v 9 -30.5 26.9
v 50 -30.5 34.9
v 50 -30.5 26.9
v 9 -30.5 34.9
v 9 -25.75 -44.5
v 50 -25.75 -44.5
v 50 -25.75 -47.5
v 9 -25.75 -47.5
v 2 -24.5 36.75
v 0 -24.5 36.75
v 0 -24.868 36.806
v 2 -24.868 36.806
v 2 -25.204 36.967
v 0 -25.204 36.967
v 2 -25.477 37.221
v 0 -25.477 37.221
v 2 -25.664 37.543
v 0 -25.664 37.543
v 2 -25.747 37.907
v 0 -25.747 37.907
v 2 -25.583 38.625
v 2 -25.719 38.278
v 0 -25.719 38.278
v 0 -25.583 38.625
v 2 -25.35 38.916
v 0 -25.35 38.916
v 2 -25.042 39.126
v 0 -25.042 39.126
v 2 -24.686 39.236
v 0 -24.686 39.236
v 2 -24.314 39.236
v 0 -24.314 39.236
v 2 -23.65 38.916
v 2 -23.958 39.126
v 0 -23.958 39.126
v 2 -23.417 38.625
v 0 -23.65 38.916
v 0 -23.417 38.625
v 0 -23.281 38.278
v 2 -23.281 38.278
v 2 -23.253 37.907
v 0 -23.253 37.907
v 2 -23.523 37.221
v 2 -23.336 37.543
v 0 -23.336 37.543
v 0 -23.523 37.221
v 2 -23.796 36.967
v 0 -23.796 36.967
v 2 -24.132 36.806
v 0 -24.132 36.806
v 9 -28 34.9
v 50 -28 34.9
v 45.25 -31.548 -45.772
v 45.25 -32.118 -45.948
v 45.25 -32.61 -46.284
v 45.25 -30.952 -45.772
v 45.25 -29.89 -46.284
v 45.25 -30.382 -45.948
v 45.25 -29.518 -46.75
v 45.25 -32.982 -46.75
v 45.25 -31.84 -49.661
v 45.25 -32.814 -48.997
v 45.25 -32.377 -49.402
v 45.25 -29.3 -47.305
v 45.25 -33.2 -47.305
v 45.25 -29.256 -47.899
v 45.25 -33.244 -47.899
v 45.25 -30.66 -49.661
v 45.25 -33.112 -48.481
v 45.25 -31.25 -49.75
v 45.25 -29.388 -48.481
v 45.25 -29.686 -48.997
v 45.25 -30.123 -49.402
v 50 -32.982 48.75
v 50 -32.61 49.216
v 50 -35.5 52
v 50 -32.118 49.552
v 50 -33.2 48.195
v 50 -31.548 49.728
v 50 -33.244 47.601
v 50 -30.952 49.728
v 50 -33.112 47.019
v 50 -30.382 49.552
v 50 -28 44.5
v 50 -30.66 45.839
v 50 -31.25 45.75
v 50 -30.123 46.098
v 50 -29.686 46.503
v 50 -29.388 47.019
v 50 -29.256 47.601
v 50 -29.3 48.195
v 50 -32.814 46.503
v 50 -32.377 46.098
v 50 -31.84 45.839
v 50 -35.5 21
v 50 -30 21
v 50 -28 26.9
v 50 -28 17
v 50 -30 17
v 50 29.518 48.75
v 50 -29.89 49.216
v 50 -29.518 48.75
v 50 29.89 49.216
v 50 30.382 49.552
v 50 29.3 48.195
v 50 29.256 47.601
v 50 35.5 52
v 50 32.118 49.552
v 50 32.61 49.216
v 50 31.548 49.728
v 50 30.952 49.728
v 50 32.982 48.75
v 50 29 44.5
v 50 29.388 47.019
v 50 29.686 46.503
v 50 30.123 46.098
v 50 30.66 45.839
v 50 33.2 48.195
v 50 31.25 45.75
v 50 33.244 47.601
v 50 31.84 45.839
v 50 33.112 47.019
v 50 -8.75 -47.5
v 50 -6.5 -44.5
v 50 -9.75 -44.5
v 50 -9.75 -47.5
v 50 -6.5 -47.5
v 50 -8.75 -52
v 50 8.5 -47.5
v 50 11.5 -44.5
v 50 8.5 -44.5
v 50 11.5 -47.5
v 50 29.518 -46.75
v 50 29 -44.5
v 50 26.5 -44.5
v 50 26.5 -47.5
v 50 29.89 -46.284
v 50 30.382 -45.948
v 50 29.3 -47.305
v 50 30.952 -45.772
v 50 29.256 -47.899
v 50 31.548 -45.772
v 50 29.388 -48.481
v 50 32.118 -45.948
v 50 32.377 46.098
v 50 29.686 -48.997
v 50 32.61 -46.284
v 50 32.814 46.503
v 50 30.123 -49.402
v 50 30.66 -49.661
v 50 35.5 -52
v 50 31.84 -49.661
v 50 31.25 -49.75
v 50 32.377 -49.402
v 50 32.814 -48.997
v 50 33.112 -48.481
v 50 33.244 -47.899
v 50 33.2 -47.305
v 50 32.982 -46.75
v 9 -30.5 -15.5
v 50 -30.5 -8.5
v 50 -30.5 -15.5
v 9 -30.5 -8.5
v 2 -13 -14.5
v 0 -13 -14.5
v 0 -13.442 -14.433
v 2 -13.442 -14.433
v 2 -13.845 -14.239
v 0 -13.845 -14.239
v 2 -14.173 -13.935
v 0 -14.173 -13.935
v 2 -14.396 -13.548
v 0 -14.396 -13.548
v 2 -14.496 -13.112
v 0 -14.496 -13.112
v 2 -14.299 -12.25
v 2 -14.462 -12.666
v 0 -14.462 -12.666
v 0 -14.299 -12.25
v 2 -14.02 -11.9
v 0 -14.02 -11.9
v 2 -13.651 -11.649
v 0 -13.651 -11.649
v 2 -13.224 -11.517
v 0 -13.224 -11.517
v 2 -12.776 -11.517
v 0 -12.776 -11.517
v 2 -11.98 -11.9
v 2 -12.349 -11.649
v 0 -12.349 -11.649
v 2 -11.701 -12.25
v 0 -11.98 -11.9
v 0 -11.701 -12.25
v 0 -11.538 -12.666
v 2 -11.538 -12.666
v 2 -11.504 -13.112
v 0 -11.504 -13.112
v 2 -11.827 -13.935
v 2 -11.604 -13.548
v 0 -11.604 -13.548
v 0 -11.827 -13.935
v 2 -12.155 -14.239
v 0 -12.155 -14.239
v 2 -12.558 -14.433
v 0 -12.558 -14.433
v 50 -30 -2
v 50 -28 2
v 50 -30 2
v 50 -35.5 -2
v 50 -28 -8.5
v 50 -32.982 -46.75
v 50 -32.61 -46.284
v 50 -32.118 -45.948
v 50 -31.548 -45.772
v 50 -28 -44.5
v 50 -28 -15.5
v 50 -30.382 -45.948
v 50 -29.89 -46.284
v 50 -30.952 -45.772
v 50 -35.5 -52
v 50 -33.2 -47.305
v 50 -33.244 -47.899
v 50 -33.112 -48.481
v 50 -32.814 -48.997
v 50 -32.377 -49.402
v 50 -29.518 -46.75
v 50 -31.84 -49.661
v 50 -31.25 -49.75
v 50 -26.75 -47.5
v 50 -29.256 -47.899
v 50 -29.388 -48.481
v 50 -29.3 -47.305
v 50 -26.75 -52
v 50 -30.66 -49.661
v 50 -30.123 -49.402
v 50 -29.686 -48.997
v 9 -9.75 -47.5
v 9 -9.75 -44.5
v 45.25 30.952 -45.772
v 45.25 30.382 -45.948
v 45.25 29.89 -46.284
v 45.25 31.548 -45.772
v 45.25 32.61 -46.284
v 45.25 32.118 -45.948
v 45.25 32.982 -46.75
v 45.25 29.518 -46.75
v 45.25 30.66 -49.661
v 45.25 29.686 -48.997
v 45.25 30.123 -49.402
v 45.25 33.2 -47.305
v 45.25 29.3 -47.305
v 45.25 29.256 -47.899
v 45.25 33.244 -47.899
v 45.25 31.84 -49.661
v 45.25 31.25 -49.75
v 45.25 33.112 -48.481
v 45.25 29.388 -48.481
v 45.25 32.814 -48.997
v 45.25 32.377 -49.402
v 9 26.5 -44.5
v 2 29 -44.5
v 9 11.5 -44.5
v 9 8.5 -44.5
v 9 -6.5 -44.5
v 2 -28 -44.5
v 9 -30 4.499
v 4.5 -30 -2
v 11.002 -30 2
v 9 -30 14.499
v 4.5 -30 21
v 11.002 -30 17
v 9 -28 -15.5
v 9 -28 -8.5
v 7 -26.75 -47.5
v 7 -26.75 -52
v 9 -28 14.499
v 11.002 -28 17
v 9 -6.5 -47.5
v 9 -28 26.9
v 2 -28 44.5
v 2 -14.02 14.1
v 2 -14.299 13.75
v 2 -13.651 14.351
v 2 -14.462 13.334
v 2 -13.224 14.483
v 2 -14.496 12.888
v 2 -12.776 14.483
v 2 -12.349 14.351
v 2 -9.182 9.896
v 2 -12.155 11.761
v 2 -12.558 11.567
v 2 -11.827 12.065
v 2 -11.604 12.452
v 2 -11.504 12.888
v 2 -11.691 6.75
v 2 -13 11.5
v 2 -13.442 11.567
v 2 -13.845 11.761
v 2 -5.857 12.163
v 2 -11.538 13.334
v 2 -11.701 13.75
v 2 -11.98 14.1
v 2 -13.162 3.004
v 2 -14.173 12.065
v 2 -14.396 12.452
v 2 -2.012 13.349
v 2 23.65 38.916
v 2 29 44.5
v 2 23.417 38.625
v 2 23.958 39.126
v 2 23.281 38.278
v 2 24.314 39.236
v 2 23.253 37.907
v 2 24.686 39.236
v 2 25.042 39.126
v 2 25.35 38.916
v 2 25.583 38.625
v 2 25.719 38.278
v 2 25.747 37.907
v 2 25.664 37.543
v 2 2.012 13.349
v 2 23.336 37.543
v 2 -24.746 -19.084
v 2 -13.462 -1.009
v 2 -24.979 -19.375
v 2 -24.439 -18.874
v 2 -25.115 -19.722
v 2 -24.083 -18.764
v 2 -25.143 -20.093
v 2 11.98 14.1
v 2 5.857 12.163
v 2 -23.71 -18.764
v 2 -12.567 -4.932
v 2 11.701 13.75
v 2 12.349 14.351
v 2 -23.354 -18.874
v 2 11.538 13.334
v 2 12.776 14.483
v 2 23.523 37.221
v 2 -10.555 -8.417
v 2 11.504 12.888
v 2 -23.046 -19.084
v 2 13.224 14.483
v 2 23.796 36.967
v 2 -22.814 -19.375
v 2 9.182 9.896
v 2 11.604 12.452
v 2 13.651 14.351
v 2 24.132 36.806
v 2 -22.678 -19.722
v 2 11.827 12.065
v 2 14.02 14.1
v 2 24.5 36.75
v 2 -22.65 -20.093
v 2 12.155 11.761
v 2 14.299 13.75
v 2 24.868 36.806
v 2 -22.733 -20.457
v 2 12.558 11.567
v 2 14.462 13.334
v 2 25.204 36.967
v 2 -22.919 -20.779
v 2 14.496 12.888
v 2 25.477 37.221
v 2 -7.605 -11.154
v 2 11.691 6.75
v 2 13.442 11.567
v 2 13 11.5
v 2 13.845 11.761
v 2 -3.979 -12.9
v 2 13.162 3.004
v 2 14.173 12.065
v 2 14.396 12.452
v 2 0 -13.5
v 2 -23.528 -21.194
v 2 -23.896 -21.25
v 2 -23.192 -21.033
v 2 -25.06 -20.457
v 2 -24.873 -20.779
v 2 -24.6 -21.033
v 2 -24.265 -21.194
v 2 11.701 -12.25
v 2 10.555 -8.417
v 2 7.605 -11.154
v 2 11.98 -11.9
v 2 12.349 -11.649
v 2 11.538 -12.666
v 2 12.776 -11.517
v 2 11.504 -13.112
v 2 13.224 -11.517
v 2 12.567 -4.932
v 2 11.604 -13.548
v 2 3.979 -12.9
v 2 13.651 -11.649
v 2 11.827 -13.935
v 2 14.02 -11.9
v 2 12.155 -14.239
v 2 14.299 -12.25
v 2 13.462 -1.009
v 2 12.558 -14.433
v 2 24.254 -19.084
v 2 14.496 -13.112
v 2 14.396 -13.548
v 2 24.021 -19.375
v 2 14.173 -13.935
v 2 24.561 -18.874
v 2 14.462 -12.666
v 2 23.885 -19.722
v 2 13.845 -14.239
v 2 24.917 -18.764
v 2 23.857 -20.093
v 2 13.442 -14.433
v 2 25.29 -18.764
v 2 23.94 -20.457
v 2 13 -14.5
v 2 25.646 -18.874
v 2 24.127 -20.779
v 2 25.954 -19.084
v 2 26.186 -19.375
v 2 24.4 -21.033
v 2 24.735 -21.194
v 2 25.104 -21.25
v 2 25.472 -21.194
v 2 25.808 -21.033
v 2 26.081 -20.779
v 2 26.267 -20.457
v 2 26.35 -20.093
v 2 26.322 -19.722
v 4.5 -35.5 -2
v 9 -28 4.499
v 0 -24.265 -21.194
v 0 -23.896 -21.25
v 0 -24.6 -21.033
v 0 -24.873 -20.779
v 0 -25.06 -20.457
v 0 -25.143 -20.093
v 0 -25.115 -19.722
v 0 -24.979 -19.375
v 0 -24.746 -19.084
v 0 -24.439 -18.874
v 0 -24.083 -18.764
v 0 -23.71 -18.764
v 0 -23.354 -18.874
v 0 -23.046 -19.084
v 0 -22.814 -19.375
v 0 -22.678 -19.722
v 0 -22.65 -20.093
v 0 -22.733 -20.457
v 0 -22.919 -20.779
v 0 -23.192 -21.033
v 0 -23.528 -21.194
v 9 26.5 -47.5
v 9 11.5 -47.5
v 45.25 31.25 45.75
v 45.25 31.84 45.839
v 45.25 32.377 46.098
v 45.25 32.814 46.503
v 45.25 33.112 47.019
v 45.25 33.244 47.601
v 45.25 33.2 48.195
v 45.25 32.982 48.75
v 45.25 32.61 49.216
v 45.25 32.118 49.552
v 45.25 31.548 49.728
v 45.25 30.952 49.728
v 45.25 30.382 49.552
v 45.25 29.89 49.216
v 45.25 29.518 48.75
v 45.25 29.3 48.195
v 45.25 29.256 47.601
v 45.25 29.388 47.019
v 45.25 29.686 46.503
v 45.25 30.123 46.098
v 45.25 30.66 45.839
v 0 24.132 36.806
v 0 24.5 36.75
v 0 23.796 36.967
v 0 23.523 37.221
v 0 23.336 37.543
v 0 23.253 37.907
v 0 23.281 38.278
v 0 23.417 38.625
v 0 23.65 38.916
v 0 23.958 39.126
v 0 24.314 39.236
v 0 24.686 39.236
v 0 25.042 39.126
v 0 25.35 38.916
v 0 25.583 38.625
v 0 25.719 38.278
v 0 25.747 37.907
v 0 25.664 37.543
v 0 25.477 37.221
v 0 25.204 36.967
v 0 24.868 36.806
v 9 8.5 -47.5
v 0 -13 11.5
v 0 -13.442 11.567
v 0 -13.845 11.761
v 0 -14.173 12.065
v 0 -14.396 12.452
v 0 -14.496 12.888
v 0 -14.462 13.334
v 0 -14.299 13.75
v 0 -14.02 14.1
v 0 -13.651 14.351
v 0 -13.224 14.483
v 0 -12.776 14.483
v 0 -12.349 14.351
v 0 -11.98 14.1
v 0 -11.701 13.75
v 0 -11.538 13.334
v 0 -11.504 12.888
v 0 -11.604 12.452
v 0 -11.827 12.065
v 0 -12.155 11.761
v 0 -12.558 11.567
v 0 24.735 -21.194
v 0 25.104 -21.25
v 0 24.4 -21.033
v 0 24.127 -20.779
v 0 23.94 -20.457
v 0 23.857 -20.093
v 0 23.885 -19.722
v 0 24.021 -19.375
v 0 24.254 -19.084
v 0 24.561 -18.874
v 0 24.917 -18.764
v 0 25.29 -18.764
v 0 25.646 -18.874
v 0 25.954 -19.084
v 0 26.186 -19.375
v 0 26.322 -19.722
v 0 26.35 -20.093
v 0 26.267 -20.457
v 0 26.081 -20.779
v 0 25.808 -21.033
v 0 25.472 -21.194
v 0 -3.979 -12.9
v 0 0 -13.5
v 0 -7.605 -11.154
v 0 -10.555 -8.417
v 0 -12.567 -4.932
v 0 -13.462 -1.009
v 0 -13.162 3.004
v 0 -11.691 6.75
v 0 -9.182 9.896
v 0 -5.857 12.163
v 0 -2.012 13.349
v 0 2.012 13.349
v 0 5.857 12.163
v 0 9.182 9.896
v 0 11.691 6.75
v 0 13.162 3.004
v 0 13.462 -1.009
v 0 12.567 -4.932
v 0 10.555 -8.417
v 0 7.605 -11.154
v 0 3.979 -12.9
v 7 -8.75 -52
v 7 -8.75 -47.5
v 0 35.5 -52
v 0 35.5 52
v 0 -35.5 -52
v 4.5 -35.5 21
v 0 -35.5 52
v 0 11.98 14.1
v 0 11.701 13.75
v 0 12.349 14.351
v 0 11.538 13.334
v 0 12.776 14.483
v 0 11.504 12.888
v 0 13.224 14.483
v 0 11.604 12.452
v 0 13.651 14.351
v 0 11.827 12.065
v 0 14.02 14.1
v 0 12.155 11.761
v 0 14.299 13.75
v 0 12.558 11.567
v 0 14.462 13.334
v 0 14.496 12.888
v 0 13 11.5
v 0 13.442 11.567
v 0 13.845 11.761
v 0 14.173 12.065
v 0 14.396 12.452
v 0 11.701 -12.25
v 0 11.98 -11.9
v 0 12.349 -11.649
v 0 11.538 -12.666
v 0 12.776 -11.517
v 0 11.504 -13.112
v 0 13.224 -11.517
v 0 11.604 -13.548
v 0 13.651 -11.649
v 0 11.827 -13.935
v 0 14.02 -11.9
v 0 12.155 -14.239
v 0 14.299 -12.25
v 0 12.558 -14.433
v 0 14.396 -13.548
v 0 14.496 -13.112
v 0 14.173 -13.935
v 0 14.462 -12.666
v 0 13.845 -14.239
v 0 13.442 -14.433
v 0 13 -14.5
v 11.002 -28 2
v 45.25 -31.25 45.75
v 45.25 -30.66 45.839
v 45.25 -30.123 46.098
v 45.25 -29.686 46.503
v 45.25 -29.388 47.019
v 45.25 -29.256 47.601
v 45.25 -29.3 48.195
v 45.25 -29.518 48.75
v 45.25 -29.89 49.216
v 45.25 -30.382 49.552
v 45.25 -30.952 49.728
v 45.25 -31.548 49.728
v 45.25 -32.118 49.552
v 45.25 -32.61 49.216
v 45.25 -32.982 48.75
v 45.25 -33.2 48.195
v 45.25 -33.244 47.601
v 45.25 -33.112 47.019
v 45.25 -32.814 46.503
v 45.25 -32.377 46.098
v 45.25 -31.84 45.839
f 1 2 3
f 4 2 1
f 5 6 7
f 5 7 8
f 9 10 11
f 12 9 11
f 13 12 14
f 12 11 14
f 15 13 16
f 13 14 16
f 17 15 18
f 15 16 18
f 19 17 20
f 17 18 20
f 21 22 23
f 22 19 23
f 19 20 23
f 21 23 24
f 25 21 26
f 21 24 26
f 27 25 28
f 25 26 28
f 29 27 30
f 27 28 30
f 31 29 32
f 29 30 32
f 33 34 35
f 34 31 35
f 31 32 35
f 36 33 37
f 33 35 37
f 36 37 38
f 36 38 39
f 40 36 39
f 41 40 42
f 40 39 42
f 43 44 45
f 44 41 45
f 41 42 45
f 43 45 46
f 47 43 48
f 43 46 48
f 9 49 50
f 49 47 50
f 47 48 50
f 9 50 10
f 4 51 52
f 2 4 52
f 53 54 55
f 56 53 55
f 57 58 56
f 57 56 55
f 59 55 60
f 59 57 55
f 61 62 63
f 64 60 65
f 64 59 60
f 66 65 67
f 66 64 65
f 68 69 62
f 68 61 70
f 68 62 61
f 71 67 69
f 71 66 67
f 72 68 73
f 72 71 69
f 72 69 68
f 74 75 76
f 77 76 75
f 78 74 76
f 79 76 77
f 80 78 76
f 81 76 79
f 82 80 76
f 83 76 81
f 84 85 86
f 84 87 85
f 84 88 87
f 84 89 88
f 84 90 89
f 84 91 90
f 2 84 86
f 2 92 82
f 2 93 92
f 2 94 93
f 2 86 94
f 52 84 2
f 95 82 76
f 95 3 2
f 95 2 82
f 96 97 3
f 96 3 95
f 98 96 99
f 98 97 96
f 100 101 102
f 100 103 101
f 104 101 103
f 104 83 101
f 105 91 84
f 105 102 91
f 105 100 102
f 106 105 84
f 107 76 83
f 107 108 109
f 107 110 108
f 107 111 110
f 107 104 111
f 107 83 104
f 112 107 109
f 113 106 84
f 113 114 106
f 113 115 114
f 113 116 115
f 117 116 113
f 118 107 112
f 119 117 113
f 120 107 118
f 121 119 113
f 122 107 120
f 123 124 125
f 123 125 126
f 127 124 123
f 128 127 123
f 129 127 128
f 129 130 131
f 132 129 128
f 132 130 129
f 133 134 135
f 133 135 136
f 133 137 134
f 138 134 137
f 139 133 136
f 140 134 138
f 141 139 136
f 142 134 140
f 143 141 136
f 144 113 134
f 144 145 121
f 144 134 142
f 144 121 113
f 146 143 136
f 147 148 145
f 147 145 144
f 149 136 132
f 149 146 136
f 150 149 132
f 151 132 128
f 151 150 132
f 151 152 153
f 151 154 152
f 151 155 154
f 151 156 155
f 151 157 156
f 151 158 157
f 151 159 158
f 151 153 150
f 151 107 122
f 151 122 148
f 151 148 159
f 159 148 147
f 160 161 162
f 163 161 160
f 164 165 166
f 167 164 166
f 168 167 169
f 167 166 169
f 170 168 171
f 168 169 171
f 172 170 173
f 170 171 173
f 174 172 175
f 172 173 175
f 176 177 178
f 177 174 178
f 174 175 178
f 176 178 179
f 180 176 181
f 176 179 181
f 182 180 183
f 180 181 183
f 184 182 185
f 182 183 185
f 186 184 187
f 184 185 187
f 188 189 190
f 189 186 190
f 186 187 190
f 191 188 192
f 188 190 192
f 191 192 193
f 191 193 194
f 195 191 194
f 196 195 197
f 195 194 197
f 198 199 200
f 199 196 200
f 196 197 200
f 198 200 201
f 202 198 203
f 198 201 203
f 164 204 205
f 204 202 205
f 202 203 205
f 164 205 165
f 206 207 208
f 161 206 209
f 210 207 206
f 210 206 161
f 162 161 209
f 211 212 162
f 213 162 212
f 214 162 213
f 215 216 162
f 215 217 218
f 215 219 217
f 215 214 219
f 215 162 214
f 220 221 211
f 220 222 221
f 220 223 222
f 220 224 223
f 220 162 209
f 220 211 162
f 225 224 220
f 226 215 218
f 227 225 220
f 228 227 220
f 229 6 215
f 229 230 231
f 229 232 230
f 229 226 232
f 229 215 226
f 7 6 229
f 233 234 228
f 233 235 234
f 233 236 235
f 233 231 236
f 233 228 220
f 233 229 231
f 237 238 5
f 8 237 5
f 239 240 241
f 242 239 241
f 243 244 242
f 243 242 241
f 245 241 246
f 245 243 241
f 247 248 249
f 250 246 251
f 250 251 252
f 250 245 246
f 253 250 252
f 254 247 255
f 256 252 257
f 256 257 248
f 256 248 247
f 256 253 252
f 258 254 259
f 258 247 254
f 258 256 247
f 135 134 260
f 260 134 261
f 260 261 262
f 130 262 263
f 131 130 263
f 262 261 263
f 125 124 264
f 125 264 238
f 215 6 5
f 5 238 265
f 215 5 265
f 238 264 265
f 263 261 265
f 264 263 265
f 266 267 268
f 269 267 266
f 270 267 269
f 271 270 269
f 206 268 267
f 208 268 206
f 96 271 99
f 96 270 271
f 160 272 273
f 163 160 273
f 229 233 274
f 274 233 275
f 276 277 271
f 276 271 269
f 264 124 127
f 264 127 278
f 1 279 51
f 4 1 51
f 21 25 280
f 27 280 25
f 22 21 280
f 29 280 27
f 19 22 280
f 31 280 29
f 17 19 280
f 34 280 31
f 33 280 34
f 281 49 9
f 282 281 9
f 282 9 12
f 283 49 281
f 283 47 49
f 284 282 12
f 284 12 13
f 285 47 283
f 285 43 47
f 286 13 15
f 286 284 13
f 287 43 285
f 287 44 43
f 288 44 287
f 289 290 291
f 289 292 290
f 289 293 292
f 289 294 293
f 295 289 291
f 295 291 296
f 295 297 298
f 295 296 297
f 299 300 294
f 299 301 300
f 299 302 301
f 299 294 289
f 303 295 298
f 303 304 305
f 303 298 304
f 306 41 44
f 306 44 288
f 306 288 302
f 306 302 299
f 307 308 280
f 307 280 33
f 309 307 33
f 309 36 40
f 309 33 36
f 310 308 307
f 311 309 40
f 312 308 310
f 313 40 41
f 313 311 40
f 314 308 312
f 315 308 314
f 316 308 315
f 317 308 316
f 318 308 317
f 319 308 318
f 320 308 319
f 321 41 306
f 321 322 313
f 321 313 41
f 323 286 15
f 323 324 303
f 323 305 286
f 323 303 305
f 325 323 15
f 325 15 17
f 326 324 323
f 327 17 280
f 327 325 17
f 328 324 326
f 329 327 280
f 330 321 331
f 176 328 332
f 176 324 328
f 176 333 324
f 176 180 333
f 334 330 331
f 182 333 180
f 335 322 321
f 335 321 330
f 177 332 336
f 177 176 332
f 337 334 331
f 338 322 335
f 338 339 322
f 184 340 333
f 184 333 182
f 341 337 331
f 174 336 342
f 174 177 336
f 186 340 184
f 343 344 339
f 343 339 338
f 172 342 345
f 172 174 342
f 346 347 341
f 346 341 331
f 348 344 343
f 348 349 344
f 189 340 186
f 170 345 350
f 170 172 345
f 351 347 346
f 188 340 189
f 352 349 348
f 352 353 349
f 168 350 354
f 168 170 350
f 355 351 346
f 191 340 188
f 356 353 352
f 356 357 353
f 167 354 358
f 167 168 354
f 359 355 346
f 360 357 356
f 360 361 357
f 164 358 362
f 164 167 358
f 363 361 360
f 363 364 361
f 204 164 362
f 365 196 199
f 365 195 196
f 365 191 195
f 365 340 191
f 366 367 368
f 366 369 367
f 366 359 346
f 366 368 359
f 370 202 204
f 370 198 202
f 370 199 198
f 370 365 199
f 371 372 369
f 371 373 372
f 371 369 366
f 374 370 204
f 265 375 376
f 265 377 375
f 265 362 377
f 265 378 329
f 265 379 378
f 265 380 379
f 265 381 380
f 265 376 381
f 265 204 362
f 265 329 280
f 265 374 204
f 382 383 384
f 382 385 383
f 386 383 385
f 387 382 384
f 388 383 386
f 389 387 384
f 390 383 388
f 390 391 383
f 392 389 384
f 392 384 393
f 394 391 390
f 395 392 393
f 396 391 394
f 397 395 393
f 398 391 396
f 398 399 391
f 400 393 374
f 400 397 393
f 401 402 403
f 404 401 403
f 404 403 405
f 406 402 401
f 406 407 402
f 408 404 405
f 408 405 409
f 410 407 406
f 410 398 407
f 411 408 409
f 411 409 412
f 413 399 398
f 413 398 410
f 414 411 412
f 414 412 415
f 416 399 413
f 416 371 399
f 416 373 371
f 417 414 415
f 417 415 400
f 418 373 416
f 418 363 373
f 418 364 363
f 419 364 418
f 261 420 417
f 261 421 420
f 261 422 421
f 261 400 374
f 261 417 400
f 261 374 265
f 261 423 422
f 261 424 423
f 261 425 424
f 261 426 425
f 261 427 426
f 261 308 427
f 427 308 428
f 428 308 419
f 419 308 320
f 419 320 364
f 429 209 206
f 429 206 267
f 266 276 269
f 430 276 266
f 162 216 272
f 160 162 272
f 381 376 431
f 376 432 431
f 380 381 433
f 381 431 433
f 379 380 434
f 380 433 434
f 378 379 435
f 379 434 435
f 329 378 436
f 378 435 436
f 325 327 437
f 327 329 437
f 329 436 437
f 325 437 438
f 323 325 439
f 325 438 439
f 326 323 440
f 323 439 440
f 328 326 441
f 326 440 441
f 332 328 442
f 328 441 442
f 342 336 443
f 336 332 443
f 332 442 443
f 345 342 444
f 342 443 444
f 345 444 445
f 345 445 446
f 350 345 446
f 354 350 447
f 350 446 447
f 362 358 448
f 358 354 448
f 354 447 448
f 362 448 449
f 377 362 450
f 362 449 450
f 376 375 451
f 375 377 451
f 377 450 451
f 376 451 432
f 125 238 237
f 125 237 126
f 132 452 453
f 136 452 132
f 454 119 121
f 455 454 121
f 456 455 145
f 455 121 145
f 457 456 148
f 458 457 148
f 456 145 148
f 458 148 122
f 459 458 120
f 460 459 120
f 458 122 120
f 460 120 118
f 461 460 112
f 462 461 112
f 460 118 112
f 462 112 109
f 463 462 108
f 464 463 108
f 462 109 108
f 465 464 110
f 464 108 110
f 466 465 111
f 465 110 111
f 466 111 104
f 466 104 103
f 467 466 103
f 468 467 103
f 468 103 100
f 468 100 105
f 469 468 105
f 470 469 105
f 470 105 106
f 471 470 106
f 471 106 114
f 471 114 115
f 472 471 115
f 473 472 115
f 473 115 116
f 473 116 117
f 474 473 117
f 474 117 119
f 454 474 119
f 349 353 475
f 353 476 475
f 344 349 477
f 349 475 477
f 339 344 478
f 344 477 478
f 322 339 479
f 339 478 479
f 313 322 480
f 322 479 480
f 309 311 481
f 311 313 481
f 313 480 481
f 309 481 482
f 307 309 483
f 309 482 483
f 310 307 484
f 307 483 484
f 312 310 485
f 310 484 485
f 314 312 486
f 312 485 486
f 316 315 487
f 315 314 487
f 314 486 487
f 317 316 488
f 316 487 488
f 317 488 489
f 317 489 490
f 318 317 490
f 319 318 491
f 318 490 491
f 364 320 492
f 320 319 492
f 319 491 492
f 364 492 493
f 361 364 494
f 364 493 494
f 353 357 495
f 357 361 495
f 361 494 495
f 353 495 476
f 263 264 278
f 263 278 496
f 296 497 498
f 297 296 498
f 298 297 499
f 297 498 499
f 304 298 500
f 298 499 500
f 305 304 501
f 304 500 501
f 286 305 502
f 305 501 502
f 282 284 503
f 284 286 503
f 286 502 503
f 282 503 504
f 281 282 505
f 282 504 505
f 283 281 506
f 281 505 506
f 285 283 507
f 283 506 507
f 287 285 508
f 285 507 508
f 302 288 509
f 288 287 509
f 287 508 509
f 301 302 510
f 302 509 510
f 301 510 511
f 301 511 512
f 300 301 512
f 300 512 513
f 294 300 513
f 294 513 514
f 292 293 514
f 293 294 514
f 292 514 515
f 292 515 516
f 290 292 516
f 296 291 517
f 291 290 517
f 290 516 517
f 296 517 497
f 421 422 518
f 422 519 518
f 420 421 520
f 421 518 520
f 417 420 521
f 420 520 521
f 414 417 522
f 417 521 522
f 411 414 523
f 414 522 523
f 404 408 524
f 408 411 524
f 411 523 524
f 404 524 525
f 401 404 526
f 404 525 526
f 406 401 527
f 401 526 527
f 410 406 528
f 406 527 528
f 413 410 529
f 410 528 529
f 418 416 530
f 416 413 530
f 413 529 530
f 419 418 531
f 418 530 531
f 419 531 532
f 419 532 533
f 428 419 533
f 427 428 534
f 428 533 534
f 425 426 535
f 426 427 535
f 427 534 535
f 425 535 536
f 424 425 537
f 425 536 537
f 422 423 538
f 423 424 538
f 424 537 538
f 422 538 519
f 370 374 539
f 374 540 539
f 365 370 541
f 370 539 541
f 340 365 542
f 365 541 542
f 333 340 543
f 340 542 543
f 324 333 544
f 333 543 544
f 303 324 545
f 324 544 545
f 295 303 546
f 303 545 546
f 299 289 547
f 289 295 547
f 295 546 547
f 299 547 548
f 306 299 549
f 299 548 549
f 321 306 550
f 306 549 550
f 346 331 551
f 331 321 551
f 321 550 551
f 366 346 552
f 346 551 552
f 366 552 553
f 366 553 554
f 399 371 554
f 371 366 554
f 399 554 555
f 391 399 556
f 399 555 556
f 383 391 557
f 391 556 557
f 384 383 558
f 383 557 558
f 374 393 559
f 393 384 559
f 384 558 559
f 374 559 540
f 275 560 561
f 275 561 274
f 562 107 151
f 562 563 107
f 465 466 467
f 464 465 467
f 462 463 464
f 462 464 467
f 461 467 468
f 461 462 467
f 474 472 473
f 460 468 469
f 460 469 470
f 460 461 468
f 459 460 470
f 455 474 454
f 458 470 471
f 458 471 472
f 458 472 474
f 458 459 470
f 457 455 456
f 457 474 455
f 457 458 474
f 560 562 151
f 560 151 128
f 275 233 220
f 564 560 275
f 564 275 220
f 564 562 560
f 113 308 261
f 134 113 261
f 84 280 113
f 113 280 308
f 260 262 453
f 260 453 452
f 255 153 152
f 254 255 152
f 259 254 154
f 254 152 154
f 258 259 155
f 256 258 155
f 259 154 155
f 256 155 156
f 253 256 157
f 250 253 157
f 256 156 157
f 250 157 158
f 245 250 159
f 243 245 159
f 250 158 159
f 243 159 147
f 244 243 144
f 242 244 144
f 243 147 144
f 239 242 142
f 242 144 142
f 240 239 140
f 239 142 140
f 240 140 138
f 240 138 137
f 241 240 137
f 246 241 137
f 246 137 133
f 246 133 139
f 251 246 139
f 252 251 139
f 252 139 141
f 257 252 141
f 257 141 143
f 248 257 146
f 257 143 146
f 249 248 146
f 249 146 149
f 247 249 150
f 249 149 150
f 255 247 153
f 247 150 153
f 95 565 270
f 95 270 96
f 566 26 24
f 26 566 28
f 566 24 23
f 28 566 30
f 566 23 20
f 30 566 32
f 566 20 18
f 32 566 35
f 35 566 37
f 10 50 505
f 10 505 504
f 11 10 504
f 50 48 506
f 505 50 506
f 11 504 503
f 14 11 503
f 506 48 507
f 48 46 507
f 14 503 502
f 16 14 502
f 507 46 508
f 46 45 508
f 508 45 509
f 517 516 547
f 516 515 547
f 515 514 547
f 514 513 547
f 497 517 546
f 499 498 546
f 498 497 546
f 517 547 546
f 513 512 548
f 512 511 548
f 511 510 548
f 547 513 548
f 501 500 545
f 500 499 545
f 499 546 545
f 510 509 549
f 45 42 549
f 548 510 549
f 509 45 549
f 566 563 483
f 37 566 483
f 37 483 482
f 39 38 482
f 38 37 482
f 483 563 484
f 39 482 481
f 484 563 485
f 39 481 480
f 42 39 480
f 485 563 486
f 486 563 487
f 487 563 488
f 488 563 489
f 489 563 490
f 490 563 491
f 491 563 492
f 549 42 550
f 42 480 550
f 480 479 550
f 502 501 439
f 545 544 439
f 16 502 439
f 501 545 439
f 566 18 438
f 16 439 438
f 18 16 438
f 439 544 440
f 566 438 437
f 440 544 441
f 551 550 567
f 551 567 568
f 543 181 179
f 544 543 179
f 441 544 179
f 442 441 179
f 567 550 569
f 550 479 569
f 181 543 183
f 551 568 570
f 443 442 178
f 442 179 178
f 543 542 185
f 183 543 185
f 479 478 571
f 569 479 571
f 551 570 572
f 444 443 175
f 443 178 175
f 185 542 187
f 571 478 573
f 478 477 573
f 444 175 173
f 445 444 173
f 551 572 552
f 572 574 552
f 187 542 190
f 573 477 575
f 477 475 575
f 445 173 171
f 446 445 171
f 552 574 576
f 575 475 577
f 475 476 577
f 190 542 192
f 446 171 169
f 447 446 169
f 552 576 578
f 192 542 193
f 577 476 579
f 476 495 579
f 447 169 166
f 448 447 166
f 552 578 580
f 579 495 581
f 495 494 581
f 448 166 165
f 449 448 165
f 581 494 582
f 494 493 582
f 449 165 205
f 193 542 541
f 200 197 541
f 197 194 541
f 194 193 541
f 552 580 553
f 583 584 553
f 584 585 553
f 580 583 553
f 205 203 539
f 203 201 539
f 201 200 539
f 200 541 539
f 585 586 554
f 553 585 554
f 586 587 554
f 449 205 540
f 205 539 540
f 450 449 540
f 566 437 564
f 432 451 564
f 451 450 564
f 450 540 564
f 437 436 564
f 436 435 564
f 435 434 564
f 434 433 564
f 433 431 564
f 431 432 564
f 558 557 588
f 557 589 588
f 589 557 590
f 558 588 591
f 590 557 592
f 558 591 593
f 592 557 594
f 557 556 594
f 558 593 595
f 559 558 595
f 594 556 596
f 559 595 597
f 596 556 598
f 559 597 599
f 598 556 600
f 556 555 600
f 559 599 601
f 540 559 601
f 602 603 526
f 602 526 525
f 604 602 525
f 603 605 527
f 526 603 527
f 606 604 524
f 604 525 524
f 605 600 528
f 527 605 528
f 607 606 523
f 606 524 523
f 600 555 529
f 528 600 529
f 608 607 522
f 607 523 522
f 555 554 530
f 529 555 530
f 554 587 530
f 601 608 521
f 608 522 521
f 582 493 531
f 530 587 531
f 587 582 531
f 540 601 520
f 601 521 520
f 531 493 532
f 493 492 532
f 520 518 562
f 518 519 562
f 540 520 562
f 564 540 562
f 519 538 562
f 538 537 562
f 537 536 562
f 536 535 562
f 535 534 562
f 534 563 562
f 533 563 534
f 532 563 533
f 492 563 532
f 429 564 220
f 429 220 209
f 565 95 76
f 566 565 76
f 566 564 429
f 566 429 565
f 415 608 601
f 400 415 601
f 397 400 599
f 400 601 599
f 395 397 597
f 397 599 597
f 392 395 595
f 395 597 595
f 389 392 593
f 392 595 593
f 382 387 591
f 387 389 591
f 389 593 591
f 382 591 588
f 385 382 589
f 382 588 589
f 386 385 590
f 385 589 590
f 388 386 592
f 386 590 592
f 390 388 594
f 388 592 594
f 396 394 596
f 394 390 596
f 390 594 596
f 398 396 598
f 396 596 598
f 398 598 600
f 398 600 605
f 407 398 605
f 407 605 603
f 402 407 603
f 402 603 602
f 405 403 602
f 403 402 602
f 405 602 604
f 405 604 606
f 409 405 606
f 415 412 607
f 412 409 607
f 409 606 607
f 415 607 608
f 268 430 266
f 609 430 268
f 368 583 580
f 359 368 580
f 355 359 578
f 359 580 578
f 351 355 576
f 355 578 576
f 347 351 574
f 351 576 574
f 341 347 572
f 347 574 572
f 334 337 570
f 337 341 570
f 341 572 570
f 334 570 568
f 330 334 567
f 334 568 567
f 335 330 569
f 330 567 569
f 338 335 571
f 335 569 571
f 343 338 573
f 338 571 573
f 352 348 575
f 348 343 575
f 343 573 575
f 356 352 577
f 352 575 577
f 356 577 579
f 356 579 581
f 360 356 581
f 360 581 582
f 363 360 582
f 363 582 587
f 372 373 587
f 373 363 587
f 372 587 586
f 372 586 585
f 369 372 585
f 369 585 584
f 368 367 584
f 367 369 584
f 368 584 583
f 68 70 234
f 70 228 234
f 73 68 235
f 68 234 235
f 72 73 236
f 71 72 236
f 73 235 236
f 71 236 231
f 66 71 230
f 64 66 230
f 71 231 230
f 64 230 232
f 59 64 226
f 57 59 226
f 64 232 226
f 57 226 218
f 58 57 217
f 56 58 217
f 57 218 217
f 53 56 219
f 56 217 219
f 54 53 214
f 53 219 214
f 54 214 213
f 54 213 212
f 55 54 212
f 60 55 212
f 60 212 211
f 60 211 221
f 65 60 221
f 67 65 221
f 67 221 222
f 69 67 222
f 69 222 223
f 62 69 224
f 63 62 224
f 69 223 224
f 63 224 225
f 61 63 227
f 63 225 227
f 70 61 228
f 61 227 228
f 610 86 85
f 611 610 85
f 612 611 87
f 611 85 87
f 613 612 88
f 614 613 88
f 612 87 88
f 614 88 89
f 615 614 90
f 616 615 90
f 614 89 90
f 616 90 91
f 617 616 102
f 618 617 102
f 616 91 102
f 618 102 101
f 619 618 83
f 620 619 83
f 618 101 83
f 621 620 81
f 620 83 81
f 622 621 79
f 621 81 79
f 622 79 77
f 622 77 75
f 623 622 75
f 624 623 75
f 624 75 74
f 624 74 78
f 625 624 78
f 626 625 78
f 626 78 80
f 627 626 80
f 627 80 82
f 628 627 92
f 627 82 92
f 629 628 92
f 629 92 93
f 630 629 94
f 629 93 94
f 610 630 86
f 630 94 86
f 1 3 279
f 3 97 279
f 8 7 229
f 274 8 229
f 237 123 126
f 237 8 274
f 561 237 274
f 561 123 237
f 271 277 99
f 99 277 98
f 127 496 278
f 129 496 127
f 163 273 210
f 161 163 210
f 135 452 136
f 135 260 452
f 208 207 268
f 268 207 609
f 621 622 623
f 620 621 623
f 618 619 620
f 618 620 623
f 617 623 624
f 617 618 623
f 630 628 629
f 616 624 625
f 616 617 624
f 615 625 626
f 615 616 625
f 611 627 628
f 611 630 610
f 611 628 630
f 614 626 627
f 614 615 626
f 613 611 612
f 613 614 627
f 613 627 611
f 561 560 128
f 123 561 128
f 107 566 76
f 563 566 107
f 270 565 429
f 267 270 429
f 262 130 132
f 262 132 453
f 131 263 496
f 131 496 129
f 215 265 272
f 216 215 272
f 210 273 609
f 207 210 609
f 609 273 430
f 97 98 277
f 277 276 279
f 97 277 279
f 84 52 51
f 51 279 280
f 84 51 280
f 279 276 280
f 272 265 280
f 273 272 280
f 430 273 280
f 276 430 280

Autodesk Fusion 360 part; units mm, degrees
sketch "Sketch1" plane through (0, 0, 0) normal (1, 0, 0) x (0, 0, -1)
  line L0 (-44.5, 28) -> (44.5, 28)
  line L1 (44.5, 28) -> (44.5, -28)
  line L2 (44.5, -28) -> (-44.5, -28)
  line L3 (-44.5, -28) -> (-44.5, 28)
  line L4 (-44.5, 28) -> (44.5, -28) construction
  line L5 (44.5, 28) -> (-44.5, -28) construction
  circle A0 centre (-38, 24.5) radius 1.25
  circle A1 centre (-38, -24.5) radius 1.25
  circle A2 centre (20, 25.1038) radius 1.25
  circle A3 centre (20, -23.8962) radius 1.25
  line L6 (-52, 35.5) -> (52, 35.5)
  line L7 (52, 35.5) -> (52, -35.5)
  line L8 (52, -35.5) -> (-52, -35.5)
  line L9 (-52, -35.5) -> (-52, 35.5)
  line L10 (-52, 35.5) -> (52, -35.5) construction
  line L11 (52, 35.5) -> (-52, -35.5) construction
  line L12 (-44.5, 28) -> (-44.5, 29)
  line L13 (-44.5, 29) -> (44.5, 29)
  line L14 (44.5, 29) -> (44.5, 28)
  circle A4 centre (0, 0) radius 13.5
  line L15 (-15, 15) -> (15, 15)
  line L16 (15, 15) -> (15, -15)
  line L17 (15, -15) -> (-15, -15)
  line L18 (-15, -15) -> (-15, 15)
  line L19 (-15, 15) -> (15, -15) construction
  line L20 (15, 15) -> (-15, -15) construction
  circle A5 centre (13, 13) radius 1.5
  circle A6 centre (-13, 13) radius 1.5
  circle A7 centre (-13, -13) radius 1.5
  circle A8 centre (13, -13) radius 1.5
  dimension "d1" = 89
  dimension "d2" = 56
  dimension "d3" = 2.5
  dimension "d4" = 3.5
  dimension "d5" = 6.5
  dimension "d6" = 2.5
  dimension "d7" = 6.5
  dimension "d8" = 49
  dimension "d9" = 2.5
  dimension "d10" = 2.5
  dimension "d11" = 49
  dimension "d12" = 58
  dimension "d13" = 58
  dimension "d16" = 104
  dimension "d17" = 71
  dimension "d86" = 27
  dimension "d87" = 30
  dimension "d88" = 30
  dimension "d89" = 3
  dimension "d90" = 3
  dimension "d91" = 3
  dimension "d92" = 3
  dimension "d93" = 2
  dimension "d94" = 2
  dimension "d95" = 2
  dimension "d96" = 2
extrude "Extrude1" add sketch "Sketch1" along normal blind 2 contours L0 L12 L13 L14 | L0 L1 L2 L3 | L15 L16 L17 L18
extrude "Extrude2" add sketch "Sketch1" along normal blind 50 contours L6 L7 L8 L9
sketch "Sketch2" plane through (0, -28, 0) normal (0, 1, 0) x (-1, 0, 0)
  line L0 (-2, -44.5) -> (-2, 44.5)
  line L1 (-2, 44.5) -> (-50, 44.5)
  line L2 (-50, 44.5) -> (-50, -44.5)
  line L3 (-50, -44.5) -> (-2, -44.5)
  line L4 (-9, 34.9) -> (-12, 34.9)
  line L5 (-12, 34.9) -> (-12, 26.9)
  line L6 (-12, 26.9) -> (-9, 26.9)
  line L7 (-9, 26.9) -> (-9, 34.9)
  line L8 (-12, 34.9) -> (-50, 34.9)
  line L9 (-50, 34.9) -> (-50, 26.9)
  line L10 (-50, 26.9) -> (-12, 26.9)
  line L11 (-12, 26.9) -> (-12, 34.9)
  line L12 (-9, 14.4989) -> (-9, 4.4989)
  line L13 (-9, 4.4989) -> (-11.002, 2)
  line L14 (-11.002, 2) -> (-15.002, 2)
  line L15 (-15.002, 2) -> (-15.002, 17)
  line L16 (-15.002, 17) -> (-11.002, 17)
  line L17 (-11.002, 17) -> (-9, 14.4989)
  line L18 (-15.002, 17) -> (-50, 17)
  line L19 (-50, 17) -> (-50, 2)
  line L20 (-50, 2) -> (-15.002, 2)
  line L21 (-15.002, 2) -> (-15.002, 17)
  line L22 (-9, -8.5) -> (-16, -8.5)
  line L23 (-16, -8.5) -> (-16, -15.5)
  line L24 (-16, -15.5) -> (-9, -15.5)
  line L25 (-9, -15.5) -> (-9, -8.5)
  line L26 (-16, -8.5) -> (-50.0121, -8.5)
  line L27 (-50.0121, -8.5) -> (-50.0121, -15.5)
  line L28 (-50.0121, -15.5) -> (-16, -15.5)
  line L29 (-16, -15.5) -> (-16, -8.5)
  dimension "d20" = 3
  dimension "d21" = 8
  dimension "d22" = 9.6
  dimension "d30" = 10
  dimension "d33" = 4
  dimension "d34" = 15
  dimension "d35" = 4
  dimension "d36" = 7
  dimension "d37" = 7
  dimension "d38" = 27.5
  dimension "d39" = 7
  dimension "d40" = 7
  dimension "d41" = 7
  dimension "d42" = 53
extrude "Extrude3" cut sketch "Sketch2" against normal blind 2.5 contours L2 L26 L27 L28 | L2 L23 L26 L28 L29 | L2 L5 L8 L9 L10 L11 | L22 L23 L24 L25 L29 | L4 L5 L6 L7 L11 | L2 L15 L18 L19 L20 L21 | L12 L13 L14 L15 L16 L17 L21
sketch "Sketch3" plane through (0, -35.5, 0) normal (0, -1, 0) x (1, 0, 0)
  line L0 (0, 52) -> (0, -52)
  line L1 (0, -52) -> (50, -52)
  line L2 (50, -52) -> (50, 52)
  line L3 (50, 52) -> (0, 52)
  line L4 (19.5, 21) -> (4.5, 21)
  line L5 (4.5, 21) -> (4.5, -2)
  line L6 (4.5, -2) -> (19.5, -2)
  line L7 (19.5, -2) -> (19.5, 21)
  line L8 (19.5, 21) -> (50, 21)
  line L9 (50, 21) -> (50, -2)
  line L10 (50, -2) -> (19.5, -2)
  line L11 (19.5, -2) -> (19.5, 21)
  dimension "d45" = 15
  dimension "d46" = 23
  dimension "d47" = 31
  dimension "d48" = 4.5
extrude "Extrude4" cut sketch "Sketch3" against normal blind 5.5 contours L2 L7 L8 L9 L10 L11 | L4 L5 L6 L7 L11
sketch "Sketch4" plane through (0, 0, -44.5) normal (0, 0, 1) x (1, 0, 0)
  line L0 (2, 29) -> (2, -28)
  line L1 (2, -28) -> (50, -28)
  line L2 (50, -28) -> (50, 29)
  line L3 (9, -25.75) -> (22.5, -25.75)
  line L4 (22.5, -25.75) -> (22.5, -9.75)
  line L5 (22.5, -9.75) -> (9, -9.75)
  line L6 (9, -9.75) -> (9, -25.75)
  line L7 (25, -6.5) -> (9, -6.5)
  line L8 (9, -6.5) -> (9, 8.5)
  line L9 (9, 8.5) -> (25, 8.5)
  line L10 (25, 8.5) -> (25, -6.5)
  line L11 (25, 11.5) -> (9, 11.5)
  line L12 (9, 11.5) -> (9, 26.5)
  line L13 (9, 26.5) -> (25, 26.5)
  line L14 (25, 26.5) -> (25, 11.5)
  line L15 (25, 26.5) -> (50, 26.5)
  line L16 (50, 26.5) -> (50, 11.5)
  line L17 (50, 11.5) -> (25, 11.5)
  line L18 (25, 11.5) -> (25, 26.5)
  line L19 (25, 8.5) -> (50, 8.5)
  line L20 (50, 8.5) -> (50, -6.5)
  line L21 (50, -6.5) -> (25, -6.5)
  line L22 (25, -6.5) -> (25, 8.5)
  line L23 (22.5, -9.75) -> (50, -9.75)
  line L24 (50, -9.75) -> (50, -25.75)
  line L25 (50, -25.75) -> (22.5, -25.75)
  line L26 (22.5, -25.75) -> (22.5, -9.75)
  line L27 (50, 29) -> (2, 29)
  dimension "d51" = 13.5
  dimension "d52" = 16
  dimension "d53" = 2.25
  dimension "d54" = 7
  dimension "d55" = 16
  dimension "d56" = 15
  dimension "d57" = 7
  dimension "d58" = 21.5
  dimension "d59" = 16
  dimension "d60" = 15
  dimension "d61" = 7
  dimension "d62" = 39.5
  dimension "d65" = 15
extrude "Extrude5" cut sketch "Sketch4" against normal blind 3 contours L2 L14 L15 L16 L17 L18 | L2 L4 L23 L24 L25 L26 | L11 L12 L13 L14 L18 | L3 L4 L5 L6 L26 | L2 L10 L19 L20 L21 L22 | L7 L8 L9 L10 L22
sketch "Sketch5" plane through (0, 0, -52) normal (0, 0, -1) x (-1, 0, 0)
  line L0 (0, -35.5) -> (0, 35.5)
  line L1 (0, 35.5) -> (-50, 35.5)
  line L2 (-50, 35.5) -> (-50, -35.5)
  line L3 (-50, -35.5) -> (0, -35.5)
  line L4 (-7, -26.75) -> (-23, -26.75)
  line L5 (-23, -26.75) -> (-23, -8.75)
  line L6 (-23, -8.75) -> (-7, -8.75)
  line L7 (-7, -8.75) -> (-7, -26.75)
  line L8 (-23, -8.75) -> (-50, -8.75)
  line L9 (-50, -8.75) -> (-50, -26.75)
  line L10 (-50, -26.75) -> (-23, -26.75)
  line L11 (-23, -26.75) -> (-23, -8.75)
  dimension "d66" = 16
  dimension "d67" = 18
  dimension "d68" = 8.75
  dimension "d69" = 7
extrude "Extrude6" cut sketch "Sketch5" against normal blind 4.5 contours L2 L5 L8 L9 L10 L11 | L4 L5 L6 L7 L11
sketch "Sketch6" plane through (50, 0, 0) normal (1, 0, 0) x (0, 0, -1)
  line L0 (47.5, -8.75) -> (52, -8.75)
  line L1 (52, -8.75) -> (52, 35.5)
  line L2 (52, 35.5) -> (-52, 35.5)
  line L3 (-52, 35.5) -> (-52, -35.5)
  line L4 (-52, -35.5) -> (-21, -35.5)
  line L5 (-21, -35.5) -> (-21, -30)
  line L6 (-21, -30) -> (-17, -30)
  line L7 (-17, -30) -> (-17, -28)
  line L8 (-17, -28) -> (-26.9, -28)
  line L9 (-26.9, -28) -> (-26.9, -30.5)
  line L10 (-26.9, -30.5) -> (-34.9, -30.5)
  line L11 (-34.9, -30.5) -> (-34.9, -28)
  line L12 (-34.9, -28) -> (-44.5, -28)
  line L13 (-44.5, -28) -> (-44.5, 29)
  line L14 (44.5, 29) -> (44.5, 26.5)
  line L15 (44.5, 26.5) -> (47.5, 26.5)
  line L16 (47.5, 26.5) -> (47.5, 11.5)
  line L17 (47.5, 11.5) -> (44.5, 11.5)
  line L18 (44.5, 11.5) -> (44.5, 8.5)
  line L19 (44.5, 8.5) -> (47.5, 8.5)
  line L20 (47.5, 8.5) -> (47.5, -6.5)
  line L21 (47.5, -6.5) -> (44.5, -6.5)
  line L22 (44.5, -6.5) -> (44.5, -9.75)
  line L23 (44.5, -9.75) -> (47.5, -9.75)
  line L24 (47.5, -9.75) -> (47.5, -8.75)
  circle A0 centre (-47.75, 31.25) radius 2
  circle A1 centre (-47.75, -31.25) radius 2
  circle A2 centre (47.75, 31.25) radius 2
  circle A3 centre (47.75, -31.25) radius 2
  line L25 (52, -35.5) -> (52, -26.75)
  line L26 (2, -35.5) -> (52, -35.5)
  line L27 (-44.5, 29) -> (44.5, 29)
  dimension "d72" = 4
  dimension "d73" = 4
  dimension "d74" = 4
  dimension "d75" = 4
  dimension "d76" = 4.25
  dimension "d77" = 4.25
  dimension "d78" = 4.25
  dimension "d79" = 4.25
  dimension "d80" = 4.25
  dimension "d81" = 4.25
  dimension "d82" = 4.25
  dimension "d83" = 4.25
extrude "Extrude7" cut sketch "Sketch6" against normal blind 4.75 contours A0 | A1 | A2 | A3
